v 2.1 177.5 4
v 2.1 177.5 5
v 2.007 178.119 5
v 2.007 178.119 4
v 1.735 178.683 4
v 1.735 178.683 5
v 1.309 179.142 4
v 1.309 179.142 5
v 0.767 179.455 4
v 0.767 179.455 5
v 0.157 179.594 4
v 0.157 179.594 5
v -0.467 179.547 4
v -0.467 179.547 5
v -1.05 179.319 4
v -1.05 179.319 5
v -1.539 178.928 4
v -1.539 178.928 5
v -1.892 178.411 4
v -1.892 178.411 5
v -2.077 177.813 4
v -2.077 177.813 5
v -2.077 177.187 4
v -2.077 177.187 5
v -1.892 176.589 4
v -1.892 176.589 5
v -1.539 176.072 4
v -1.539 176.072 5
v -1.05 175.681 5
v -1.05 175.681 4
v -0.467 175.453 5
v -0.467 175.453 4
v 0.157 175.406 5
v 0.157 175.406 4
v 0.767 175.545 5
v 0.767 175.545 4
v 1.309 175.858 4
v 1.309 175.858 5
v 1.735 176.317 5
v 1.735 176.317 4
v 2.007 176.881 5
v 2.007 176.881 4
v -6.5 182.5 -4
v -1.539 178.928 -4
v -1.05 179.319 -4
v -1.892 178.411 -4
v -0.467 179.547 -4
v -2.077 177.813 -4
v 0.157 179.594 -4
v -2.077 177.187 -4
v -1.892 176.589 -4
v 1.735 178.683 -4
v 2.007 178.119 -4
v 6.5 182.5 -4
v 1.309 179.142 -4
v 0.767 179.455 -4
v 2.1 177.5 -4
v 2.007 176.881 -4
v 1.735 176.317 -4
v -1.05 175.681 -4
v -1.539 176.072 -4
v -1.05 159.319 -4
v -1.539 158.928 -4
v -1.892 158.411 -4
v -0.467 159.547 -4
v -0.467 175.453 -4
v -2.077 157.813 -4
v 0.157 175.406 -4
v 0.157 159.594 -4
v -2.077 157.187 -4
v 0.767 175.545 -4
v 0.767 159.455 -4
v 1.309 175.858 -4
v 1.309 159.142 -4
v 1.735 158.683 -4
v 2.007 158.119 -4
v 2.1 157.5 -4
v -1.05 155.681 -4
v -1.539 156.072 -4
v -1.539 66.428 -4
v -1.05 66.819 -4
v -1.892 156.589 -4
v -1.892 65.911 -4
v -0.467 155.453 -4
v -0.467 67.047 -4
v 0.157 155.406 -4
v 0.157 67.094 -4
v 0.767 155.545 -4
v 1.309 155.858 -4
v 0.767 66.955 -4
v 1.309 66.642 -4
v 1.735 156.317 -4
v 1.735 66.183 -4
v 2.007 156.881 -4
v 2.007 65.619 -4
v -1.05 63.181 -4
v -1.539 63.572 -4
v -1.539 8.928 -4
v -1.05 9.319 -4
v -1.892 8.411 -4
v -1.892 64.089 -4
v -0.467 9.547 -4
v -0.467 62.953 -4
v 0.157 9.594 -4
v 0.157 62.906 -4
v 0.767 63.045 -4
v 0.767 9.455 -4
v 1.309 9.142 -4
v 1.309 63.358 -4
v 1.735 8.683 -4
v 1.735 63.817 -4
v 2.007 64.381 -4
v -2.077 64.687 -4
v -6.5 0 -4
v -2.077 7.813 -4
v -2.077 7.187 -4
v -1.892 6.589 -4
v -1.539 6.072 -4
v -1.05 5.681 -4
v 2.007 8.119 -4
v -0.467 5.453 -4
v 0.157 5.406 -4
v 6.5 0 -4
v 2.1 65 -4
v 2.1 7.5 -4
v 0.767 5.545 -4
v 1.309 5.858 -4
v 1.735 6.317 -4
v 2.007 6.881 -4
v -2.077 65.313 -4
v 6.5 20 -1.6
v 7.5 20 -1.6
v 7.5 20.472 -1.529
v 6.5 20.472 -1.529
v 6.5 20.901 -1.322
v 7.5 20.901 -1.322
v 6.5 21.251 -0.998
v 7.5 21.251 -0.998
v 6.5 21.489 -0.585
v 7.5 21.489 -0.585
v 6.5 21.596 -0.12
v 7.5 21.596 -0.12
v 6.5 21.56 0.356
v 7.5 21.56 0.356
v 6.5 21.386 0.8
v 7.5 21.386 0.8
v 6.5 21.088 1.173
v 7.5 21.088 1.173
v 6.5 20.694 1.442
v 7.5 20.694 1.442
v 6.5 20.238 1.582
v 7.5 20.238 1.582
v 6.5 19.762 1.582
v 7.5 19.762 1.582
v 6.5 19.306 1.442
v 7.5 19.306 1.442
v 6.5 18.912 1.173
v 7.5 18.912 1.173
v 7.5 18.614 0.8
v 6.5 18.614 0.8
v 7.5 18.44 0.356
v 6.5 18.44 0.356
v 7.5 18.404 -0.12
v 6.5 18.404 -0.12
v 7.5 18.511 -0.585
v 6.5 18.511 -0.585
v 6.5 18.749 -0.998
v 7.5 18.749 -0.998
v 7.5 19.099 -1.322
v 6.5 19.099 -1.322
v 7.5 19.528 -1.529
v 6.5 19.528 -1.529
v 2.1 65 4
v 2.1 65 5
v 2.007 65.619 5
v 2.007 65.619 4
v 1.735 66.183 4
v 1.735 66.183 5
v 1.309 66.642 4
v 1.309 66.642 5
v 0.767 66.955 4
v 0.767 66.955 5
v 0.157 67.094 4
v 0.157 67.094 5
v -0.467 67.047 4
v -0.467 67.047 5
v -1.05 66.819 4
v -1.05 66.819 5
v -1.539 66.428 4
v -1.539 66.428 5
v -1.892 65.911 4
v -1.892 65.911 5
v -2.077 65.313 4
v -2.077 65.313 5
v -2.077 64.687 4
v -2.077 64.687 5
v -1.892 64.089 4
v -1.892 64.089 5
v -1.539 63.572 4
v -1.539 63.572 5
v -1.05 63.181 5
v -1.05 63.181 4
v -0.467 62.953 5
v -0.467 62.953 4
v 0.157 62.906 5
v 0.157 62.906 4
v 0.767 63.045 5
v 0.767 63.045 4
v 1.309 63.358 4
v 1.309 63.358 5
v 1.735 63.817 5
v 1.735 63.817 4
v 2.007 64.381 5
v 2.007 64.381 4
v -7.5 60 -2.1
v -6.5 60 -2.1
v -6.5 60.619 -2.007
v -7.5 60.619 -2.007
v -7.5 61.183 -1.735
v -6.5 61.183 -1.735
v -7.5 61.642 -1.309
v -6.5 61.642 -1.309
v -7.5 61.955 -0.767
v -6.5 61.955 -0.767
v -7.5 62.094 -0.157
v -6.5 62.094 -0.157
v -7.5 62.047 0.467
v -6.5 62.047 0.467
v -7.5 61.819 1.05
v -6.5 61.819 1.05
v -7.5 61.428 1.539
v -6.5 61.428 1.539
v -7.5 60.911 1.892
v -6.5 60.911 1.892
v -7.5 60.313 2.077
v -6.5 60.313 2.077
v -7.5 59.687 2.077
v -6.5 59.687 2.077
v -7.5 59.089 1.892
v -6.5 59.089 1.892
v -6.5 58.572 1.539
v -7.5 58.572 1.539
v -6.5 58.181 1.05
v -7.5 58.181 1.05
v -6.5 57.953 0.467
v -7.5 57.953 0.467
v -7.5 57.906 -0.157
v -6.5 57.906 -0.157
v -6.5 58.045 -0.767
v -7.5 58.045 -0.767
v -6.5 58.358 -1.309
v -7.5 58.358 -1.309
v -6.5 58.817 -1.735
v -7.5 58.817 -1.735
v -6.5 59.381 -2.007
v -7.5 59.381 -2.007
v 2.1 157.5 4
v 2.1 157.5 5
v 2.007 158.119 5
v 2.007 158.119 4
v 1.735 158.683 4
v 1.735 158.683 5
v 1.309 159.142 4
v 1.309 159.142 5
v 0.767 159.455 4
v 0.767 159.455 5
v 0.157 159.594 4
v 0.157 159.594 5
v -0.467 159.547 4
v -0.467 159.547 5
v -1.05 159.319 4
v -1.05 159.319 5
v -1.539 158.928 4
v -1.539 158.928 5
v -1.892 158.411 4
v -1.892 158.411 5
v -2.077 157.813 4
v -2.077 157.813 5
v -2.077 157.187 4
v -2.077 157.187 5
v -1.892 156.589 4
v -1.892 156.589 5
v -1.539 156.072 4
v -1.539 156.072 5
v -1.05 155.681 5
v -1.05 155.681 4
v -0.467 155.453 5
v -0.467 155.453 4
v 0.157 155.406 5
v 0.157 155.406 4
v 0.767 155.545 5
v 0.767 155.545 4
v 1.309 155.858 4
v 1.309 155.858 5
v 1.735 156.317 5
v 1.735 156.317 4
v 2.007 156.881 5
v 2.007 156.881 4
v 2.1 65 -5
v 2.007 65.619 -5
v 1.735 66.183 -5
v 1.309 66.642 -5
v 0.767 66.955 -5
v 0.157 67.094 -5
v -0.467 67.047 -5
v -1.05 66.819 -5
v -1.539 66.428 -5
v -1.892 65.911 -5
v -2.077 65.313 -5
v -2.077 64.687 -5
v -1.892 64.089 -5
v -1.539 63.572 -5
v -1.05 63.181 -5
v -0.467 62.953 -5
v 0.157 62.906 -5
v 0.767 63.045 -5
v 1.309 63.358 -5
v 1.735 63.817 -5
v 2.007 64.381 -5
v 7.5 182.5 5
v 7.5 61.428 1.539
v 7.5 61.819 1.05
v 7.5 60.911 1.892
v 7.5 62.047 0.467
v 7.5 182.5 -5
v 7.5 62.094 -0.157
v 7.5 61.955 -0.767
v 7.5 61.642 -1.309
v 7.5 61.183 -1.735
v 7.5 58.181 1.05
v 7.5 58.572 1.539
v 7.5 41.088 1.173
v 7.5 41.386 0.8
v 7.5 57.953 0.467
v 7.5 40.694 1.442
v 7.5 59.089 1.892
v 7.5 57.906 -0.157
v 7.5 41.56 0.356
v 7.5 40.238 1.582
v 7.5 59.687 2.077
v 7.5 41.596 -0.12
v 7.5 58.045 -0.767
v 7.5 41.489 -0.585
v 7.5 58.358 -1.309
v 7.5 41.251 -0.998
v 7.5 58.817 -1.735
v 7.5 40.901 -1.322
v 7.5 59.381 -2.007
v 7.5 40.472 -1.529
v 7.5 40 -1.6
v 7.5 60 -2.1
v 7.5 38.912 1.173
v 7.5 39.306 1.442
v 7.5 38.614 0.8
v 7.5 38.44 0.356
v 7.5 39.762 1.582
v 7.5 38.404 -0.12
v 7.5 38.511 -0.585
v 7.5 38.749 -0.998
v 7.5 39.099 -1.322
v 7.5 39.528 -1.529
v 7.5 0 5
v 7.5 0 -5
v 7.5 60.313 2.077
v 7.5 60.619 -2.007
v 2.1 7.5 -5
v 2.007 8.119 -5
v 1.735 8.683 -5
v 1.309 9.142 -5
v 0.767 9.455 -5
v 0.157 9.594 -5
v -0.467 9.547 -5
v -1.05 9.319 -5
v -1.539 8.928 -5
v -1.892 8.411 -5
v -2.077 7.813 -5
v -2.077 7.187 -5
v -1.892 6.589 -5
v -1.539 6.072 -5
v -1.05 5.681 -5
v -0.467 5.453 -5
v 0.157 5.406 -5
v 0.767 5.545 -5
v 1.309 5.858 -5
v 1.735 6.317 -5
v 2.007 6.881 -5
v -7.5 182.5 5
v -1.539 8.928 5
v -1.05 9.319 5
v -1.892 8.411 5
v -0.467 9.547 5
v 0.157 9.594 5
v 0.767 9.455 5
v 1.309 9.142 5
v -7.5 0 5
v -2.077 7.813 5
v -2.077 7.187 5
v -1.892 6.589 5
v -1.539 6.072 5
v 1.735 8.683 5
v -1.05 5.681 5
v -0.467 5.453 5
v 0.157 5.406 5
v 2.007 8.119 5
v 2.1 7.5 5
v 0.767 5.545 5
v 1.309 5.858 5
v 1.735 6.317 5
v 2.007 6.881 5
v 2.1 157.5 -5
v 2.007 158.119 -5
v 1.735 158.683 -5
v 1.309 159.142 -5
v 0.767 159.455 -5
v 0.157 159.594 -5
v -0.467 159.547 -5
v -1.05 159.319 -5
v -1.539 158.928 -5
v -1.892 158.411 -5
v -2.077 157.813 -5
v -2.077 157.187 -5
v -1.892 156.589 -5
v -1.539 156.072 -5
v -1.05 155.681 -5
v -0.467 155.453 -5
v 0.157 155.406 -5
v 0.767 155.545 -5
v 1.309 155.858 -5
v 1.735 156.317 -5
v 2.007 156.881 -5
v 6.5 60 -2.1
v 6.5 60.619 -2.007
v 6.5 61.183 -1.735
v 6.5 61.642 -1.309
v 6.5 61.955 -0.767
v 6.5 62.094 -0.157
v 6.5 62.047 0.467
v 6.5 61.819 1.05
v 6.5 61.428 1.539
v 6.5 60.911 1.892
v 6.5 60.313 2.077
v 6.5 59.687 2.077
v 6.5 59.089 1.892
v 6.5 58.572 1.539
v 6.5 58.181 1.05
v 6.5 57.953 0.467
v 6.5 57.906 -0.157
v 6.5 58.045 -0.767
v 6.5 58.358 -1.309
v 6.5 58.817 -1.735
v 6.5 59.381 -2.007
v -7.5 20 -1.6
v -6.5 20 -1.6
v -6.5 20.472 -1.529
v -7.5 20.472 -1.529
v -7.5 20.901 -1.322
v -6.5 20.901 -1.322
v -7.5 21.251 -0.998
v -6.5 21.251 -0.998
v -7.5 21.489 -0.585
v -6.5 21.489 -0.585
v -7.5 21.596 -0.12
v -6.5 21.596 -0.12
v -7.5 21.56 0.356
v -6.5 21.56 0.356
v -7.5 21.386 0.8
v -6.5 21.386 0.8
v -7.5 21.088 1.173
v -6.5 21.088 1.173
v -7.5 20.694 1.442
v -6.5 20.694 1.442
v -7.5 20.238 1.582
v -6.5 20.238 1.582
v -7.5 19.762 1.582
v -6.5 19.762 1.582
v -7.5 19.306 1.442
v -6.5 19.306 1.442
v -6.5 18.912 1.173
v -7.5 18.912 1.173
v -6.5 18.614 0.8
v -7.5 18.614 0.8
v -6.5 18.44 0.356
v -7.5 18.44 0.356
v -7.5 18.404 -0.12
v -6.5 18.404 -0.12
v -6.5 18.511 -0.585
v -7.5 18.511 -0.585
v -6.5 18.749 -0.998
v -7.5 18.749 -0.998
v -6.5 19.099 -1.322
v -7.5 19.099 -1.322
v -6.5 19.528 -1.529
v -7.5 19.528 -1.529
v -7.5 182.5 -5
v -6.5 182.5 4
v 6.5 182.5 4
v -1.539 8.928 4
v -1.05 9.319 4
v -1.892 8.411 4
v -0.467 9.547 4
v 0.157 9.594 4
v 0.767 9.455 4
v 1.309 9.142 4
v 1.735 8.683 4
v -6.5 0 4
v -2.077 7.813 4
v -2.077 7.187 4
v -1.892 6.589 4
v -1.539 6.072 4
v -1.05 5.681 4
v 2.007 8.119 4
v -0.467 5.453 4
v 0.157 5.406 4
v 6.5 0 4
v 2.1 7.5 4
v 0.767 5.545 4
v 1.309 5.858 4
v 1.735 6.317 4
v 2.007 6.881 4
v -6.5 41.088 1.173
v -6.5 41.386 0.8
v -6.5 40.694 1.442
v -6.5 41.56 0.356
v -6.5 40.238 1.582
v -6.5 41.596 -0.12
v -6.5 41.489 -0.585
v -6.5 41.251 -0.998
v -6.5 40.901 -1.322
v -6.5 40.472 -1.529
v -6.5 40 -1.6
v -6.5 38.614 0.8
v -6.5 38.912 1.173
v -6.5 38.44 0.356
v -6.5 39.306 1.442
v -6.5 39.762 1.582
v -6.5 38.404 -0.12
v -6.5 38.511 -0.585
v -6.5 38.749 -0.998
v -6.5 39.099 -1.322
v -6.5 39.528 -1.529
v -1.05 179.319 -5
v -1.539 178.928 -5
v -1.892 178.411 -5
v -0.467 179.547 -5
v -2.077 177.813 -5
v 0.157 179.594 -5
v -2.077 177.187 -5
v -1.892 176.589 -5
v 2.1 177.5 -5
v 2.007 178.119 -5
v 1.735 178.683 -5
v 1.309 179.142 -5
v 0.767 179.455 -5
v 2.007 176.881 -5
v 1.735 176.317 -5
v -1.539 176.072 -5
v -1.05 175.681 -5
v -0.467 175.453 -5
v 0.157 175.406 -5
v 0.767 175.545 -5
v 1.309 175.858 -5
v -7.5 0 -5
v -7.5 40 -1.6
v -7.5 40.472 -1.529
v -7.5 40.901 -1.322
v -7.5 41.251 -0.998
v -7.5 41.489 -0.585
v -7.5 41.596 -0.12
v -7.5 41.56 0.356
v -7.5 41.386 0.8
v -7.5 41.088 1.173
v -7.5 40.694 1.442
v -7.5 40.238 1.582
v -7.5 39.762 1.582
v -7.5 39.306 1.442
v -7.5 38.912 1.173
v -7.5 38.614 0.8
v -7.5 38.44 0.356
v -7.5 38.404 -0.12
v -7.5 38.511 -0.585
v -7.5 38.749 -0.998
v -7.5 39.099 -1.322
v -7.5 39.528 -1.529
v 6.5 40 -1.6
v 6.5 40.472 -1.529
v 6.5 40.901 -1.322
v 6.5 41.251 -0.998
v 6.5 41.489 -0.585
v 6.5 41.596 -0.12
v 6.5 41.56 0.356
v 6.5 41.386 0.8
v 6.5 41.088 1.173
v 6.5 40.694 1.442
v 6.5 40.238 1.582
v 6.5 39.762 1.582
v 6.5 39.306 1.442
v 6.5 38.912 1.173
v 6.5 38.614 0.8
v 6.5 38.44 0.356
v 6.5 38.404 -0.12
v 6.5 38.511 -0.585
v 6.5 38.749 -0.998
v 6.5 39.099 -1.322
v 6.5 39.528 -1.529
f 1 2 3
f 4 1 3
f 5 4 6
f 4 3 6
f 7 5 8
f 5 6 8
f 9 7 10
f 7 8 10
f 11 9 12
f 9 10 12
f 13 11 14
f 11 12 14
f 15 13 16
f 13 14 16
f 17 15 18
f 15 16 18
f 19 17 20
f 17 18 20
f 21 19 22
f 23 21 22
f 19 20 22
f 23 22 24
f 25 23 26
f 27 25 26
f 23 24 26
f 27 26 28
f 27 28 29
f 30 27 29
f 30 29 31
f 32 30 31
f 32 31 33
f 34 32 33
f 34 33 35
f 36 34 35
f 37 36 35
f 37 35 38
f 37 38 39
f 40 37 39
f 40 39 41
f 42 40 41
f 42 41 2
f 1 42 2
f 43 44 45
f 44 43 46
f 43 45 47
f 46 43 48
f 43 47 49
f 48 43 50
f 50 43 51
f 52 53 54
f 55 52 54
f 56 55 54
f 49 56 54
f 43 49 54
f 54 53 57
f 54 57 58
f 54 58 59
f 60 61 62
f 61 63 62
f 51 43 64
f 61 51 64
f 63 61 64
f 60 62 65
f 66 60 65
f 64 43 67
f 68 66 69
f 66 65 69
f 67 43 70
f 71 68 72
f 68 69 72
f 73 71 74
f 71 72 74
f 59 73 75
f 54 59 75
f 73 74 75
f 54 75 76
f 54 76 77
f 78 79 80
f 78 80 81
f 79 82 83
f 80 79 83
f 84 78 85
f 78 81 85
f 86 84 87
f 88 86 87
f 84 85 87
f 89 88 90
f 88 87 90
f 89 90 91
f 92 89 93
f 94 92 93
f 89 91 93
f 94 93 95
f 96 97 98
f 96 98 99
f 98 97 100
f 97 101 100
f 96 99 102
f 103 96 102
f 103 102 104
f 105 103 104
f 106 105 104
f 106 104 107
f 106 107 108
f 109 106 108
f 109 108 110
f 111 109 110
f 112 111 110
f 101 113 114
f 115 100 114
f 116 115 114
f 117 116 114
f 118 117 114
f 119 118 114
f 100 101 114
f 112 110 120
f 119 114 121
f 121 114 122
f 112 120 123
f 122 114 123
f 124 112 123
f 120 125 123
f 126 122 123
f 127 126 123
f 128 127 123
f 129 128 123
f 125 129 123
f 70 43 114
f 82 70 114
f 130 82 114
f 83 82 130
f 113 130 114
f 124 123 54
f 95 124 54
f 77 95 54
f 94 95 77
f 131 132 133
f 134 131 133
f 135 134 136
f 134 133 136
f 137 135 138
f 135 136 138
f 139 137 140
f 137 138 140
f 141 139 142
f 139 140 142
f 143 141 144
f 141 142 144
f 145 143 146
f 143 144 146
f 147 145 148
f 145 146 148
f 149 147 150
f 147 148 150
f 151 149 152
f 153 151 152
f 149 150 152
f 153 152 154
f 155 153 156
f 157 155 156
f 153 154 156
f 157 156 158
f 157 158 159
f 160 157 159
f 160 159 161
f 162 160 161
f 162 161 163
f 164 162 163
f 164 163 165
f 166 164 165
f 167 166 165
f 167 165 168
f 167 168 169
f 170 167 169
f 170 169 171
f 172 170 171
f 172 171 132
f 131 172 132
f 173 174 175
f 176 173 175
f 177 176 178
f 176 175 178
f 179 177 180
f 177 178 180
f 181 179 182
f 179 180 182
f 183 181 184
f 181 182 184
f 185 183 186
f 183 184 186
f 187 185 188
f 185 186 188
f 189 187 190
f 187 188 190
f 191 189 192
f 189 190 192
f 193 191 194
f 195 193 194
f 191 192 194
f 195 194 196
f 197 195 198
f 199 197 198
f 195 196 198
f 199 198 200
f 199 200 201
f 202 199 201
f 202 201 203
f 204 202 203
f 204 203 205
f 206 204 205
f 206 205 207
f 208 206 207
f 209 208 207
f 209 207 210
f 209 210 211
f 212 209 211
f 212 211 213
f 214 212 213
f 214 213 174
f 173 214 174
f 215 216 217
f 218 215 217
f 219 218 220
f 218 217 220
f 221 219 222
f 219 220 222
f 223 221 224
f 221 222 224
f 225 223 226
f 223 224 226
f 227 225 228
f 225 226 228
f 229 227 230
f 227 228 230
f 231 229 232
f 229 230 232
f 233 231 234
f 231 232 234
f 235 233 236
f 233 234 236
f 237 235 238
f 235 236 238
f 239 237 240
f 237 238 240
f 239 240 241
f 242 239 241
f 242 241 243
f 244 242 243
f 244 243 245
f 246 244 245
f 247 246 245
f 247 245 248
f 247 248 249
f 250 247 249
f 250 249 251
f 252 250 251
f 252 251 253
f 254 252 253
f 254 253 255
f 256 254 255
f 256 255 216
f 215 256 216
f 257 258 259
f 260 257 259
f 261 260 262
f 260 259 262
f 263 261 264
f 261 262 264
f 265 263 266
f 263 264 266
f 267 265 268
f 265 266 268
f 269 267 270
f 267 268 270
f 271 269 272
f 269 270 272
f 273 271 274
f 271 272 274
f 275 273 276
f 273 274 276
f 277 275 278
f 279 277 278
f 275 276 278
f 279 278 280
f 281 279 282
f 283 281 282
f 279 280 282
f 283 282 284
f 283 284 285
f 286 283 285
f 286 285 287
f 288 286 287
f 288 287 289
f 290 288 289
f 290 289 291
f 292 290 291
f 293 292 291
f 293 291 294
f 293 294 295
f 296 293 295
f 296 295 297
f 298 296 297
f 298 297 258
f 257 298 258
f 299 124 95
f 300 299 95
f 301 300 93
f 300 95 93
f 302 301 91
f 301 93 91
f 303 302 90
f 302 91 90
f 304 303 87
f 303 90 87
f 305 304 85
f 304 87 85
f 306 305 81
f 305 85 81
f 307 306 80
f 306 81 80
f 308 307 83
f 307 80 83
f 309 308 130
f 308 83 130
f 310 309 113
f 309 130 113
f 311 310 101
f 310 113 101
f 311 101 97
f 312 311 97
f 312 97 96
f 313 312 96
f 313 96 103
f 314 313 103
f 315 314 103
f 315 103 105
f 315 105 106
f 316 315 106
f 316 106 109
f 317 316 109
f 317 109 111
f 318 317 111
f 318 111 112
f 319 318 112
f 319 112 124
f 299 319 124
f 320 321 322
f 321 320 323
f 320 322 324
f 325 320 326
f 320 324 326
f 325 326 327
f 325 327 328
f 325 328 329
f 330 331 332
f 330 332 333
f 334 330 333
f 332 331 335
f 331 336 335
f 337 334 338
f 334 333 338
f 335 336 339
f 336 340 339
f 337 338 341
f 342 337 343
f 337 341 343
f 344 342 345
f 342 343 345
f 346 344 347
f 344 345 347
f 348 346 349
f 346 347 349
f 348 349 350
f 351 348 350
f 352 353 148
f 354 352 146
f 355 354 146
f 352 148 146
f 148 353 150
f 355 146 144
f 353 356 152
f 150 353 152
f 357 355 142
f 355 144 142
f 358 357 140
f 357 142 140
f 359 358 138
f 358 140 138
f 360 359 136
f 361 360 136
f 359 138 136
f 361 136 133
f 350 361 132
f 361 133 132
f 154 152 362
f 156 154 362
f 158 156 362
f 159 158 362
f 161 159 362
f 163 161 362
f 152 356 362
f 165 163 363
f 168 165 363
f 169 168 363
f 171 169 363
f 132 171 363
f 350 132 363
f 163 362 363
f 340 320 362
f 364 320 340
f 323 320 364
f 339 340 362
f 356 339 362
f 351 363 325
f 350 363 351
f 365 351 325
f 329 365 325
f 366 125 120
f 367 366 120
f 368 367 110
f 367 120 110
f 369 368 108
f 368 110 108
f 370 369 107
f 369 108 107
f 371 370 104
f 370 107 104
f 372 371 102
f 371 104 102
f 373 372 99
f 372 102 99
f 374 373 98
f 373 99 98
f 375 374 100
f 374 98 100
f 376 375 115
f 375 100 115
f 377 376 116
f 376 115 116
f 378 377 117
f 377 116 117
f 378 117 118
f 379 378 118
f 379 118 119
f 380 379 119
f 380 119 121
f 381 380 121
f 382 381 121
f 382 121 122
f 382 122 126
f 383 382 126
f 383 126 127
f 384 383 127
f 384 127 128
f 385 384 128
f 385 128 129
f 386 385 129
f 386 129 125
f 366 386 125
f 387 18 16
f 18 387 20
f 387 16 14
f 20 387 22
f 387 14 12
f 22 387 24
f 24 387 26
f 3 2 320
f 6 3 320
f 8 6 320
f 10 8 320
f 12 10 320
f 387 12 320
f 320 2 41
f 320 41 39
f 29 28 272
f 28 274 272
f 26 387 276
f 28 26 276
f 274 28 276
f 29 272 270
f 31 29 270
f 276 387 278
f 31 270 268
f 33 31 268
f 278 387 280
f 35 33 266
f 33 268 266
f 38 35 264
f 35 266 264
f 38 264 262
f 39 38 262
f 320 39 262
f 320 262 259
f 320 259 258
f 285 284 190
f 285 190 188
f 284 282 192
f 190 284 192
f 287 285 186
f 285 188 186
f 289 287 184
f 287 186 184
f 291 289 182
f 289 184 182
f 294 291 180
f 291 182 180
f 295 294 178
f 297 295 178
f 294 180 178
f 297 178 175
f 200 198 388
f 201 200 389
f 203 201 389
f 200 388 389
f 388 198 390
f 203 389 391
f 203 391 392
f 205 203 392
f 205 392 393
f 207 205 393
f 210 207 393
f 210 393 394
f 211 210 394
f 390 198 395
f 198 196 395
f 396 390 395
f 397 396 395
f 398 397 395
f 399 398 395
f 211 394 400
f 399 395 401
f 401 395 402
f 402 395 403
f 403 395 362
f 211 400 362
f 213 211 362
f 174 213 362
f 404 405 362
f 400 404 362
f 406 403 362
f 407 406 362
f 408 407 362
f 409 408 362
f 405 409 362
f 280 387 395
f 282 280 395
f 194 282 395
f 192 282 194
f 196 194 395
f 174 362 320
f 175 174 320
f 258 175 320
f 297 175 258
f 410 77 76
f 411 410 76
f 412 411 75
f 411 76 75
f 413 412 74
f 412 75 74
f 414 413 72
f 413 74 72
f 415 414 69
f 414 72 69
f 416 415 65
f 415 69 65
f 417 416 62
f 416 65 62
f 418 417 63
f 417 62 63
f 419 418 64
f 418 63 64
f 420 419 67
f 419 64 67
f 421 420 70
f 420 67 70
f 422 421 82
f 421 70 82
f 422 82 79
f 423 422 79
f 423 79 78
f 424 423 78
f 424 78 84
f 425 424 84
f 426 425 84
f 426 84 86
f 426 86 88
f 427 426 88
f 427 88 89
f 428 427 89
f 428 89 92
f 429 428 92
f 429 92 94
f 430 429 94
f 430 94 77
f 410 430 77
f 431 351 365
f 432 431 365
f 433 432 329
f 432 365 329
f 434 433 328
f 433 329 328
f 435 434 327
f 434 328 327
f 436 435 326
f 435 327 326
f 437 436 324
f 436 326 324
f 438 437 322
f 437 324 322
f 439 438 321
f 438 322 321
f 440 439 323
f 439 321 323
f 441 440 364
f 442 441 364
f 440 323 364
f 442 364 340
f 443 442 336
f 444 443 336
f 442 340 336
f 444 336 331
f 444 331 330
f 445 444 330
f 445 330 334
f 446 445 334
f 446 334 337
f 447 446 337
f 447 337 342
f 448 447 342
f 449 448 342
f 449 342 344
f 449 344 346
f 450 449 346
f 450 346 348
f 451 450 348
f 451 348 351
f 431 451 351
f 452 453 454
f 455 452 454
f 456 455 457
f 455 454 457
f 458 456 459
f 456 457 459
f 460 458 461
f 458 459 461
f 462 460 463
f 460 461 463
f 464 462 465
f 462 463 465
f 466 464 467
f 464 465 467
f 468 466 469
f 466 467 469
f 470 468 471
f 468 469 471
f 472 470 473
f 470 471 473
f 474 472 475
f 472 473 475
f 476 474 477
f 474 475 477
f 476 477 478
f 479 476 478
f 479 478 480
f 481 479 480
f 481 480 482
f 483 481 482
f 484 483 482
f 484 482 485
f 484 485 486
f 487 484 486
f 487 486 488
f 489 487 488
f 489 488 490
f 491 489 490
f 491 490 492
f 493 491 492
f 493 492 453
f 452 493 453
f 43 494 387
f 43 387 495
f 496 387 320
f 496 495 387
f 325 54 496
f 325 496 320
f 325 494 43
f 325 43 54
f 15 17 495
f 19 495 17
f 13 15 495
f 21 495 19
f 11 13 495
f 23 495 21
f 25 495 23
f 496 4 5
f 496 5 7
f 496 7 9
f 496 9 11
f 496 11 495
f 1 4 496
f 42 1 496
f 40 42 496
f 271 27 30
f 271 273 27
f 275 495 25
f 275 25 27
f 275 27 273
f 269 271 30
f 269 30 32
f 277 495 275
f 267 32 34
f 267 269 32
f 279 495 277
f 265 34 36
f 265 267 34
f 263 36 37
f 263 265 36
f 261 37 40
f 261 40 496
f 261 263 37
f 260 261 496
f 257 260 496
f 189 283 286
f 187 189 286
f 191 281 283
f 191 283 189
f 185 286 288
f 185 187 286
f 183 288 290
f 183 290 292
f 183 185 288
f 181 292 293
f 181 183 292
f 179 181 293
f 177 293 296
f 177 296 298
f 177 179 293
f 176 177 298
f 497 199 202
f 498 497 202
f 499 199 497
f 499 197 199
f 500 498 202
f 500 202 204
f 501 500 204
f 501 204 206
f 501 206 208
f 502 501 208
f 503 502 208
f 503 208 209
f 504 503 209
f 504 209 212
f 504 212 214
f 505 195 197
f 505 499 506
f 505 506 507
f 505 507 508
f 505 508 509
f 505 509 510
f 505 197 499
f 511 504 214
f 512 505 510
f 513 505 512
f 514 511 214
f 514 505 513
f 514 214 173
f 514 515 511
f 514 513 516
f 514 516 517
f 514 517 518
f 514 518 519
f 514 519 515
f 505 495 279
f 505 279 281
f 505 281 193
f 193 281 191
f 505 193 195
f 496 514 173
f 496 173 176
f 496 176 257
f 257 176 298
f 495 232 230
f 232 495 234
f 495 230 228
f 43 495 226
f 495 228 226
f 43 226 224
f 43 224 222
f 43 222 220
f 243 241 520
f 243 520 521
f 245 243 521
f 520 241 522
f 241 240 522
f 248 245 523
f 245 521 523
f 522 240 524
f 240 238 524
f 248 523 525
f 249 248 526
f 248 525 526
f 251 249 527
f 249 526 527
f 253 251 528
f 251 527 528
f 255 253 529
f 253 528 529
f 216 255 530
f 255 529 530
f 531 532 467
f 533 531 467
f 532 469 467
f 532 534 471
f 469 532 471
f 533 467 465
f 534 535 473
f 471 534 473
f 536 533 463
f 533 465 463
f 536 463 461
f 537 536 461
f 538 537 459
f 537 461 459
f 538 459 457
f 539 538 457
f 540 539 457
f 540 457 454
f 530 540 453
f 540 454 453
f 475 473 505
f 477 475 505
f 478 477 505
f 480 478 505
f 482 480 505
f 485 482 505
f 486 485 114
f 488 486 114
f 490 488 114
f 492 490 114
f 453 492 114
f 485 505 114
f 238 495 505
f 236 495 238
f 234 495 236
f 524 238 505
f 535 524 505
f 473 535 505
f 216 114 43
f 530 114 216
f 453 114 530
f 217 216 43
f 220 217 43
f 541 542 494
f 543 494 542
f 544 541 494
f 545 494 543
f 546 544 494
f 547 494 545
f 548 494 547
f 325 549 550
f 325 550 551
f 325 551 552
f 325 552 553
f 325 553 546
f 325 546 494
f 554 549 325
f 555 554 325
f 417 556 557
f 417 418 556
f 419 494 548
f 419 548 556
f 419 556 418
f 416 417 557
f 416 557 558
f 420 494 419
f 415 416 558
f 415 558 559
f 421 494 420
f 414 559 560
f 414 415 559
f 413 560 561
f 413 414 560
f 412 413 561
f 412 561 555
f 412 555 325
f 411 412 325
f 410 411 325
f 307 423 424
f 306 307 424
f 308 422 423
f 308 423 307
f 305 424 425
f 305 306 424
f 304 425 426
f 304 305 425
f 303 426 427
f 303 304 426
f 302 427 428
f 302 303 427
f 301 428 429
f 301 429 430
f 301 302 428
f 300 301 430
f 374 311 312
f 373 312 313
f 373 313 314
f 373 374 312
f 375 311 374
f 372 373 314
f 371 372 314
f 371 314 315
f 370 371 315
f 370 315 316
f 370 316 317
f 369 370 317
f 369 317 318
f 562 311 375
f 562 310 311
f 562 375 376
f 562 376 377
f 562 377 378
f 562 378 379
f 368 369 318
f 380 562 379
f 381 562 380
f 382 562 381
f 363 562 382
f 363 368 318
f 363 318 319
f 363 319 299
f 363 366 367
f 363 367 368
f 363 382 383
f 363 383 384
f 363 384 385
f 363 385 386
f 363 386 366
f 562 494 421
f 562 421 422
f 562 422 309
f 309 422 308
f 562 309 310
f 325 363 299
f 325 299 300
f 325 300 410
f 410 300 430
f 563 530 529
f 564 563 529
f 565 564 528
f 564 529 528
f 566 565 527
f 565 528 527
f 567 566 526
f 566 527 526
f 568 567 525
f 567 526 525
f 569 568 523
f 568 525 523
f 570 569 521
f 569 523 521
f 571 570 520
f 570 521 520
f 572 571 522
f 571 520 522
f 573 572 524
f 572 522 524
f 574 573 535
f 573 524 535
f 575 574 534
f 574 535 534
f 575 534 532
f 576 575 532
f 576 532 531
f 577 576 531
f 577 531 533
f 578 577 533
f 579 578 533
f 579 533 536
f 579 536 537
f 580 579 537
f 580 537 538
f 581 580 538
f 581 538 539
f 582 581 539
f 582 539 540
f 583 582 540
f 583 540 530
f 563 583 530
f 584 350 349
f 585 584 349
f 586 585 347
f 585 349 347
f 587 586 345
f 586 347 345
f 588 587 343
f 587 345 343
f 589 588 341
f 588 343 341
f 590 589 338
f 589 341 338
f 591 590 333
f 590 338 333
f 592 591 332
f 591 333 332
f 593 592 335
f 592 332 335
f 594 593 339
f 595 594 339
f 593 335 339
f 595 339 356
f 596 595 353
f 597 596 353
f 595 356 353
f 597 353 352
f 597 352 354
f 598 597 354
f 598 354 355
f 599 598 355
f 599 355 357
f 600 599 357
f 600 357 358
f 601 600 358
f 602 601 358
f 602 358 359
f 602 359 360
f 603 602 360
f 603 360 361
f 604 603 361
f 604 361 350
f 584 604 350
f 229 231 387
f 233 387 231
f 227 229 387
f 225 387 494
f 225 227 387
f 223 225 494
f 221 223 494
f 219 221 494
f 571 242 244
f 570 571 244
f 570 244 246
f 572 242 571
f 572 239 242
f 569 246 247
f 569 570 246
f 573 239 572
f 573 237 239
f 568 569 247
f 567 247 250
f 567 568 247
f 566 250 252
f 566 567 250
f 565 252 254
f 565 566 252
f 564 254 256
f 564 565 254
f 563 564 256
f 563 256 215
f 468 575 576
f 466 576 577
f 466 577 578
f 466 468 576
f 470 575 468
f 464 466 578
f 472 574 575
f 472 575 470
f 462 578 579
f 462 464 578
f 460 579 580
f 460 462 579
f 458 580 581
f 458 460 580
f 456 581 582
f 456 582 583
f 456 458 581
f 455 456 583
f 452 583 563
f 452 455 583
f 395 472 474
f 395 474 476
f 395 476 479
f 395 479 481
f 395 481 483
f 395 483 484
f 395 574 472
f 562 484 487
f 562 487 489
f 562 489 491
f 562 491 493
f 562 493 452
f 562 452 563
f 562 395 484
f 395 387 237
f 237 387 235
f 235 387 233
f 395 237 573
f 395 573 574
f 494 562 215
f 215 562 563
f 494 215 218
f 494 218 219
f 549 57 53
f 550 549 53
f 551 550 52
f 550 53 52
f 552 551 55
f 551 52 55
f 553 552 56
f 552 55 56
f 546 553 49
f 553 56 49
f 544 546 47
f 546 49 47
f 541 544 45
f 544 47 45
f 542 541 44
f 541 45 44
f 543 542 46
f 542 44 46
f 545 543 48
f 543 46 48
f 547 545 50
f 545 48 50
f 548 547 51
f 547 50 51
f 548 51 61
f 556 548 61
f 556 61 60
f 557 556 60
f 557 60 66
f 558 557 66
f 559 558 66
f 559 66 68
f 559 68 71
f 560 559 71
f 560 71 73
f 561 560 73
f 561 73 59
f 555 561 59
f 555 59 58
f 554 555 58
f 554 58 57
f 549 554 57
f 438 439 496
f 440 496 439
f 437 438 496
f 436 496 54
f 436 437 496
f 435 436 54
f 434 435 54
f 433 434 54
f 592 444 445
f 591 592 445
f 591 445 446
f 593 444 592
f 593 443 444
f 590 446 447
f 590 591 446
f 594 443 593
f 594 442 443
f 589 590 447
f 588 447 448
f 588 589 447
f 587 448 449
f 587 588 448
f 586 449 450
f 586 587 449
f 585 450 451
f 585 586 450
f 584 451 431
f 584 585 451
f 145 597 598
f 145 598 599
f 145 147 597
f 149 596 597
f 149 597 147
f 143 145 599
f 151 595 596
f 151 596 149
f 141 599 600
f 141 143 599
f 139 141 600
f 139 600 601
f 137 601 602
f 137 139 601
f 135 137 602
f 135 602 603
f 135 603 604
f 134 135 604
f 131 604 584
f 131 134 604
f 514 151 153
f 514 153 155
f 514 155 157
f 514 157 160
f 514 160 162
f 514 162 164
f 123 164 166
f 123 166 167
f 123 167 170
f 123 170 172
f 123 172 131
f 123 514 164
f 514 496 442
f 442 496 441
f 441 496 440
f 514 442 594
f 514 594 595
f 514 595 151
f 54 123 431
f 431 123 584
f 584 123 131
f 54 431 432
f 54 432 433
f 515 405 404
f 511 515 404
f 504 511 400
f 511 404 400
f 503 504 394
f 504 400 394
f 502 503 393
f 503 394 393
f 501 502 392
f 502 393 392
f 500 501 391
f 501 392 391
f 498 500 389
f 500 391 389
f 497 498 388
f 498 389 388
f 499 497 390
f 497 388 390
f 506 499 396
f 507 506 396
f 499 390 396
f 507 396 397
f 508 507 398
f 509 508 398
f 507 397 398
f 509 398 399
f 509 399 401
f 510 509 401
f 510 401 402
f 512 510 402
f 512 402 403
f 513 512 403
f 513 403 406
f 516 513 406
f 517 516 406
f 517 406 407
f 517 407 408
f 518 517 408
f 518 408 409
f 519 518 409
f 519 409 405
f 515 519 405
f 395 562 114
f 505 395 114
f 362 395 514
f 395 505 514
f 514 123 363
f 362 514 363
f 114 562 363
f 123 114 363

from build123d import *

# Parameters (mm, degrees)
SKETCH_1_W          = 15
SKETCH_1_H          = 10
SKETCH_1_W_2        = 13
SKETCH_1_H_2        = 8
EXTRUDE_1_DEPTH     = 182.5
SKETCH_2_R          = 2.1
CUT_EXTRUDE_1_DEPTH = 183.927581299
SKETCH_3_R          = 1.6
SKETCH_3_R_2        = 2.1
CUT_EXTRUDE_2_DEPTH = 184.183651017


with BuildPart() as part:
    # ｽｹｯﾁ1 → 押し出し-薄板1 (new body)
    with BuildSketch(Plane(origin=(0, 0, 0), x_dir=(1, 0, 0), z_dir=(0, 1, 0))):
        Rectangle(SKETCH_1_W, SKETCH_1_H)
        Rectangle(SKETCH_1_W_2, SKETCH_1_H_2, mode=Mode.SUBTRACT)
    extrude(amount=EXTRUDE_1_DEPTH)

    # ｽｹｯﾁ2 → ｶｯﾄ - 押し出し1 (cut, through all)
    with BuildSketch(Plane.XY.offset(5)):
        with Locations((0, 7.5)):
            Circle(SKETCH_2_R)
        with Locations((0, 65)):
            Circle(SKETCH_2_R)
        with Locations((0, 157.5)):
            Circle(SKETCH_2_R)
        with Locations((0, 177.5)):
            Circle(SKETCH_2_R)
    extrude(amount=-CUT_EXTRUDE_1_DEPTH, mode=Mode.SUBTRACT)

    # ｽｹｯﾁ3 → ｶｯﾄ - 押し出し2 (cut, through all)
    with BuildSketch(Plane(origin=(7.5, 0, 0), x_dir=(0, 0, -1), z_dir=(1, 0, 0))):
        with Locations((0, 20)):
            Circle(SKETCH_3_R)
        with Locations((0, 60)):
            Circle(SKETCH_3_R_2)
        with Locations((0, 40)):
            Circle(SKETCH_3_R)
    extrude(amount=-CUT_EXTRUDE_2_DEPTH, mode=Mode.SUBTRACT)


solid = part.part
